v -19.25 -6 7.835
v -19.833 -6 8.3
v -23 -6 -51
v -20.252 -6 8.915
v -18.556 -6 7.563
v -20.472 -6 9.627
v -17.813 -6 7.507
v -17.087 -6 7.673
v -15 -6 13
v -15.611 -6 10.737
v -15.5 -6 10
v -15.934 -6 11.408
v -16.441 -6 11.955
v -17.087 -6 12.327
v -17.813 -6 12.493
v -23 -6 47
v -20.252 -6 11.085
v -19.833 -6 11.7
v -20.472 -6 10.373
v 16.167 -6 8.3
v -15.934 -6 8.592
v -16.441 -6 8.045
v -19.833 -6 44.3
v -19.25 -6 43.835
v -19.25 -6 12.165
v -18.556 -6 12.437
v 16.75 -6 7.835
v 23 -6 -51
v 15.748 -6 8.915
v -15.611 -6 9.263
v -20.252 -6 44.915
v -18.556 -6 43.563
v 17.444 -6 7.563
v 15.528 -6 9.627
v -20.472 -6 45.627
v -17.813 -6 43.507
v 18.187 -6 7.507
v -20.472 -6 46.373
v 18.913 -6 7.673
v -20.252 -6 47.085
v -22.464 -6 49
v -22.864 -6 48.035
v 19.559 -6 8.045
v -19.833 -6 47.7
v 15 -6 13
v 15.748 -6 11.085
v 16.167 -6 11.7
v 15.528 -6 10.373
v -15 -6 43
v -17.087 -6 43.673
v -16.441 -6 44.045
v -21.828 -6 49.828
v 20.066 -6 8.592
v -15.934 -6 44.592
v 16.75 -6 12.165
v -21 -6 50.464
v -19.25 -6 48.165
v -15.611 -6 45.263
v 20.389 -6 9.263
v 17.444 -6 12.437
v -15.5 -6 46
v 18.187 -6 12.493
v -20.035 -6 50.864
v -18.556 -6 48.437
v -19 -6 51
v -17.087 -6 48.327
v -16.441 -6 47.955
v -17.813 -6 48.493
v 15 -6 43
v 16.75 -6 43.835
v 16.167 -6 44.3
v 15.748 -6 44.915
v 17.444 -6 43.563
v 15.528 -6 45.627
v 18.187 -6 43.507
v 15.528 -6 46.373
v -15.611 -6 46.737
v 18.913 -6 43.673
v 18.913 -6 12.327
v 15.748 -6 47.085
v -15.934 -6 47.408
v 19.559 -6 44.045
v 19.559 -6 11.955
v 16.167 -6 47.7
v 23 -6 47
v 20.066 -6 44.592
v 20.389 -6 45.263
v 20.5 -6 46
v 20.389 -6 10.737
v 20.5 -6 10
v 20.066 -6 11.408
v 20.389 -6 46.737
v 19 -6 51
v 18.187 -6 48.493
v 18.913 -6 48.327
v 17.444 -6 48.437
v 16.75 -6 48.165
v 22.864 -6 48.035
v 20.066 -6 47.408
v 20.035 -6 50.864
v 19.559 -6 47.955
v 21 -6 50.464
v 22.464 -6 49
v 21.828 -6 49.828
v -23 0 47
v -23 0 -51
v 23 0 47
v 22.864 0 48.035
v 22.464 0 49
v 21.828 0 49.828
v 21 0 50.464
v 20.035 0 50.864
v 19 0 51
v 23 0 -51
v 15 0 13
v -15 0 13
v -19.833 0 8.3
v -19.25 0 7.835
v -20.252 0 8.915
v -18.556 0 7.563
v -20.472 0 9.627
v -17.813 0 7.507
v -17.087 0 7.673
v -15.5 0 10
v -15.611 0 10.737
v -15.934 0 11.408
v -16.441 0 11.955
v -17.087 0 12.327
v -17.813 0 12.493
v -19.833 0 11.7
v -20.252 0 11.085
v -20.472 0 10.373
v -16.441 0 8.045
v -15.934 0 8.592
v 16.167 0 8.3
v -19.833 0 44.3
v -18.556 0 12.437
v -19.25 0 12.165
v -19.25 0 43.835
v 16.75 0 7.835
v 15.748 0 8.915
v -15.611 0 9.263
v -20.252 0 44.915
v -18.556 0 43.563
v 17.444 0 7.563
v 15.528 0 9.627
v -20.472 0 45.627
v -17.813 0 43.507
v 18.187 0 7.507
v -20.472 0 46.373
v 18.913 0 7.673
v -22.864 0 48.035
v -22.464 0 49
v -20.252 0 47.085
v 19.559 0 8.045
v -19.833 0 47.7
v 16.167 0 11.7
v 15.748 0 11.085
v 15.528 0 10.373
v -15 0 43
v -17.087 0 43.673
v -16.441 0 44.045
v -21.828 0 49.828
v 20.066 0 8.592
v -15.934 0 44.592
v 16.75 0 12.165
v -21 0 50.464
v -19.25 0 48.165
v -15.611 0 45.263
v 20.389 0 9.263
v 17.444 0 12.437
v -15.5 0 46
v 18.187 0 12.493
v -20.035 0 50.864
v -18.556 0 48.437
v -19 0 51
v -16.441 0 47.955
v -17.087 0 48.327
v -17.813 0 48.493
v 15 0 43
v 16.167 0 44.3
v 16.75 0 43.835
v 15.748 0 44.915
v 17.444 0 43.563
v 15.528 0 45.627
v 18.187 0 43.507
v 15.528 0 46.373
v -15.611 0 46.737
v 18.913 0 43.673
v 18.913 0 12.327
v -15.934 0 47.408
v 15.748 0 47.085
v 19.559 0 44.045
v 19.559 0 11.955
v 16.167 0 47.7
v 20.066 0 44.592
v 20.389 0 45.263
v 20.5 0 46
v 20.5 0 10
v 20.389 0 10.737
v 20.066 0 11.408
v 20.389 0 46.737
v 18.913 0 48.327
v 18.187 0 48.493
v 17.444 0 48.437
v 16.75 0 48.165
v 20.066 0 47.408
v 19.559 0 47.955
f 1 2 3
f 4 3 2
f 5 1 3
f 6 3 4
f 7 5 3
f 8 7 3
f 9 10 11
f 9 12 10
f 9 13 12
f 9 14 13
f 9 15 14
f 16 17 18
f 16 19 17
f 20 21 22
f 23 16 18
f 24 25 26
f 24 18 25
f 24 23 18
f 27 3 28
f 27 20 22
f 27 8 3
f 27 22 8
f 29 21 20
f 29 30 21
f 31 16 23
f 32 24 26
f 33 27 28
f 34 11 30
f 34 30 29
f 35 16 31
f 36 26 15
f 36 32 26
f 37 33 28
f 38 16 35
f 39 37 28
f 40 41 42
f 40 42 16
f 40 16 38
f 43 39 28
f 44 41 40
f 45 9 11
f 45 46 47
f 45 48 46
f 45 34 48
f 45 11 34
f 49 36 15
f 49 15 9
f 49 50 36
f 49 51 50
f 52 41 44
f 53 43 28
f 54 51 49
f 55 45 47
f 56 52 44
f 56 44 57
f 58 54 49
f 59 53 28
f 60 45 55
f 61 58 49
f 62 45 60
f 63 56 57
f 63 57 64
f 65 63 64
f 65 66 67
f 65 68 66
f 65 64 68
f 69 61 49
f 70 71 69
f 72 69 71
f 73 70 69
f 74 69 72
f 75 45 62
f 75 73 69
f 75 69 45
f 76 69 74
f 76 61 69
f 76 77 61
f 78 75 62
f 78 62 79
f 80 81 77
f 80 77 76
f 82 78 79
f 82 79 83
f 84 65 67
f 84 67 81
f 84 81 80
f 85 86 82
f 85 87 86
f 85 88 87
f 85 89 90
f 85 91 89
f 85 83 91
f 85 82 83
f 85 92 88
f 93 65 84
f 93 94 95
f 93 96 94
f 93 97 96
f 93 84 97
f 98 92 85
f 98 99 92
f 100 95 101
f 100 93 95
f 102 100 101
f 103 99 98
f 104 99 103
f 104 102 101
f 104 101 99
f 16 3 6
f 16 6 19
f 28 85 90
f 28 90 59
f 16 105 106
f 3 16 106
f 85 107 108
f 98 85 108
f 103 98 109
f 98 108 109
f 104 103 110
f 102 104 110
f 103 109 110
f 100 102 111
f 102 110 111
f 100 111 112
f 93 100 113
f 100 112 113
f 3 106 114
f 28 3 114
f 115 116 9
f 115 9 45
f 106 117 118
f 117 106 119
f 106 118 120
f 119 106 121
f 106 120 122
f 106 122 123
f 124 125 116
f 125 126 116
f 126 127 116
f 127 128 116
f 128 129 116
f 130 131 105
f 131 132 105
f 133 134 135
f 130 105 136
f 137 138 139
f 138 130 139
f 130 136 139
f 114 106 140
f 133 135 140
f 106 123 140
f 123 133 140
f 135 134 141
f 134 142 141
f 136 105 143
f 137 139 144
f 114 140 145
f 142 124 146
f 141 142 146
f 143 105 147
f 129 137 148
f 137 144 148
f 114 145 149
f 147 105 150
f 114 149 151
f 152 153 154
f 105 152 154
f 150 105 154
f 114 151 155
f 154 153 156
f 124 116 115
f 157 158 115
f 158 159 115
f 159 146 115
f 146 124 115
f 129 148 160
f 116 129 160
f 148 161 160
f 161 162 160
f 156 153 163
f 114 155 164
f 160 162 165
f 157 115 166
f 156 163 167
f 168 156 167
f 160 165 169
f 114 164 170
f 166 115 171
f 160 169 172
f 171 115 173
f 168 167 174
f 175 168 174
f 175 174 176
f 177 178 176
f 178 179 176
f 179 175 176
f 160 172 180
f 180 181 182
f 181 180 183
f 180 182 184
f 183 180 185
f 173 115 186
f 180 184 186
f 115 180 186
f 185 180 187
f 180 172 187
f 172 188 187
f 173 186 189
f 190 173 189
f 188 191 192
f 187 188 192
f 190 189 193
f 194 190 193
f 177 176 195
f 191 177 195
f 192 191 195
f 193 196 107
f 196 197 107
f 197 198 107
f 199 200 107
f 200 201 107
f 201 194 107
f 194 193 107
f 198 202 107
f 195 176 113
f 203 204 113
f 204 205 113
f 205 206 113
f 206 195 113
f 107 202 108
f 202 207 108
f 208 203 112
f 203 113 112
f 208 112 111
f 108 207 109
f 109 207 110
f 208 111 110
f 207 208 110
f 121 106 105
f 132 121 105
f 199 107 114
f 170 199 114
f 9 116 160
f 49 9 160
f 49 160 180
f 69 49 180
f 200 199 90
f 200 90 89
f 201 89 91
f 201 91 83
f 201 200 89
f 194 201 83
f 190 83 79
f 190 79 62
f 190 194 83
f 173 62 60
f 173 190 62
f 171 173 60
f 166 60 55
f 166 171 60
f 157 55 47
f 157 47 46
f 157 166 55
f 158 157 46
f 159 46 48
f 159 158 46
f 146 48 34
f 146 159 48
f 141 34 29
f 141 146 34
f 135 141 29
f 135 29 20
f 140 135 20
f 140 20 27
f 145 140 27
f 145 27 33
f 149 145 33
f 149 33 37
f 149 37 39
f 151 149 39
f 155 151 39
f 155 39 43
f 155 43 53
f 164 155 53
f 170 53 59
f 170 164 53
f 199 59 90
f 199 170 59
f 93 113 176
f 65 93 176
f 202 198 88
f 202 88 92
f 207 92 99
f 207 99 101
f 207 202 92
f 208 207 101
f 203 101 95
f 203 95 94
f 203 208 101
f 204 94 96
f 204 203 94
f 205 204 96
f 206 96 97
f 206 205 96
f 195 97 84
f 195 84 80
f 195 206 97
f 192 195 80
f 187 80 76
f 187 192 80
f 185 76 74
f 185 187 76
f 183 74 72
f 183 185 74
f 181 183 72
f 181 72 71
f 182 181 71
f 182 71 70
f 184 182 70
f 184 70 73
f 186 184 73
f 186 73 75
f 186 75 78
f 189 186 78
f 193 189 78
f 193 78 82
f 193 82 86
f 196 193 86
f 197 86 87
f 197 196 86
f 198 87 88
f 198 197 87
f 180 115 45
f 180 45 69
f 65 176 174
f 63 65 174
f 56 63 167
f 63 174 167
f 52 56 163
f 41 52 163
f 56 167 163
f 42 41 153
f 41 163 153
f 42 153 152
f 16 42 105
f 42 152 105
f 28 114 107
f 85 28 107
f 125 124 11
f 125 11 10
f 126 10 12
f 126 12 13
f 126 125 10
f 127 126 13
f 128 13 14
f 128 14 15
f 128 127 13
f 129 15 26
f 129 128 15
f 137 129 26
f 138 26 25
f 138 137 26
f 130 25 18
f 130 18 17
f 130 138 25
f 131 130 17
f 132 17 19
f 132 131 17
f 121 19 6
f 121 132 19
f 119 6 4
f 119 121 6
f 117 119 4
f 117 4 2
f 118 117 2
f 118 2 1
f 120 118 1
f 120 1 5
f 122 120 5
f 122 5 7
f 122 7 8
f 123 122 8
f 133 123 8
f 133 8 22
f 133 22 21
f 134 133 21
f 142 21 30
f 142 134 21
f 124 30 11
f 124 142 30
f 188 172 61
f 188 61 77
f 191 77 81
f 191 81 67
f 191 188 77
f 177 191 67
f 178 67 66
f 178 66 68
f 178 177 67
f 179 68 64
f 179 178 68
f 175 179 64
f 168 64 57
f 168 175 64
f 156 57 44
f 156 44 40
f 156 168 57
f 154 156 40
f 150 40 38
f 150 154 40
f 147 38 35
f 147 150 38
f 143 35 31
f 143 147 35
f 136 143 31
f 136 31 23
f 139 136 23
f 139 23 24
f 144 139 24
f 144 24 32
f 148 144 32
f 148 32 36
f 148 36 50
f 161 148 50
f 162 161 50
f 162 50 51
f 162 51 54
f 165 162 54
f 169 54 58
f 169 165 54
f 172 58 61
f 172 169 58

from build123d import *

# Parameters (mm, degrees)
F0_R     = 2.5
F0_W     = 30
F0_H     = 30
F1_DEPTH = 6


with BuildPart() as f1:
    # F0 (on Front) → F1 (new body)
    with BuildSketch(Plane.XZ):
        with BuildLine():
            ThreePointArc((23, 47), (21.828427, 49.828427), (19, 51))
            Line((19, 51), (-19, 51))
            ThreePointArc((-19, 51), (-21.828427, 49.828427), (-23, 47))
            Line((-23, 47), (-23, -51))
            Line((-23, -51), (23, -51))
            Line((23, -51), (23, 47))
        make_face()
        with Locations((-18, 10)):
            Circle(F0_R, mode=Mode.SUBTRACT)
        with Locations((-18, 46)):
            Circle(F0_R, mode=Mode.SUBTRACT)
        with Locations((18, 10)):
            Circle(F0_R, mode=Mode.SUBTRACT)
        with Locations((0, 28)):
            Rectangle(F0_W, F0_H, mode=Mode.SUBTRACT)
        with Locations((18, 46)):
            Circle(F0_R, mode=Mode.SUBTRACT)
    extrude(amount=F1_DEPTH)


solid = f1.part
